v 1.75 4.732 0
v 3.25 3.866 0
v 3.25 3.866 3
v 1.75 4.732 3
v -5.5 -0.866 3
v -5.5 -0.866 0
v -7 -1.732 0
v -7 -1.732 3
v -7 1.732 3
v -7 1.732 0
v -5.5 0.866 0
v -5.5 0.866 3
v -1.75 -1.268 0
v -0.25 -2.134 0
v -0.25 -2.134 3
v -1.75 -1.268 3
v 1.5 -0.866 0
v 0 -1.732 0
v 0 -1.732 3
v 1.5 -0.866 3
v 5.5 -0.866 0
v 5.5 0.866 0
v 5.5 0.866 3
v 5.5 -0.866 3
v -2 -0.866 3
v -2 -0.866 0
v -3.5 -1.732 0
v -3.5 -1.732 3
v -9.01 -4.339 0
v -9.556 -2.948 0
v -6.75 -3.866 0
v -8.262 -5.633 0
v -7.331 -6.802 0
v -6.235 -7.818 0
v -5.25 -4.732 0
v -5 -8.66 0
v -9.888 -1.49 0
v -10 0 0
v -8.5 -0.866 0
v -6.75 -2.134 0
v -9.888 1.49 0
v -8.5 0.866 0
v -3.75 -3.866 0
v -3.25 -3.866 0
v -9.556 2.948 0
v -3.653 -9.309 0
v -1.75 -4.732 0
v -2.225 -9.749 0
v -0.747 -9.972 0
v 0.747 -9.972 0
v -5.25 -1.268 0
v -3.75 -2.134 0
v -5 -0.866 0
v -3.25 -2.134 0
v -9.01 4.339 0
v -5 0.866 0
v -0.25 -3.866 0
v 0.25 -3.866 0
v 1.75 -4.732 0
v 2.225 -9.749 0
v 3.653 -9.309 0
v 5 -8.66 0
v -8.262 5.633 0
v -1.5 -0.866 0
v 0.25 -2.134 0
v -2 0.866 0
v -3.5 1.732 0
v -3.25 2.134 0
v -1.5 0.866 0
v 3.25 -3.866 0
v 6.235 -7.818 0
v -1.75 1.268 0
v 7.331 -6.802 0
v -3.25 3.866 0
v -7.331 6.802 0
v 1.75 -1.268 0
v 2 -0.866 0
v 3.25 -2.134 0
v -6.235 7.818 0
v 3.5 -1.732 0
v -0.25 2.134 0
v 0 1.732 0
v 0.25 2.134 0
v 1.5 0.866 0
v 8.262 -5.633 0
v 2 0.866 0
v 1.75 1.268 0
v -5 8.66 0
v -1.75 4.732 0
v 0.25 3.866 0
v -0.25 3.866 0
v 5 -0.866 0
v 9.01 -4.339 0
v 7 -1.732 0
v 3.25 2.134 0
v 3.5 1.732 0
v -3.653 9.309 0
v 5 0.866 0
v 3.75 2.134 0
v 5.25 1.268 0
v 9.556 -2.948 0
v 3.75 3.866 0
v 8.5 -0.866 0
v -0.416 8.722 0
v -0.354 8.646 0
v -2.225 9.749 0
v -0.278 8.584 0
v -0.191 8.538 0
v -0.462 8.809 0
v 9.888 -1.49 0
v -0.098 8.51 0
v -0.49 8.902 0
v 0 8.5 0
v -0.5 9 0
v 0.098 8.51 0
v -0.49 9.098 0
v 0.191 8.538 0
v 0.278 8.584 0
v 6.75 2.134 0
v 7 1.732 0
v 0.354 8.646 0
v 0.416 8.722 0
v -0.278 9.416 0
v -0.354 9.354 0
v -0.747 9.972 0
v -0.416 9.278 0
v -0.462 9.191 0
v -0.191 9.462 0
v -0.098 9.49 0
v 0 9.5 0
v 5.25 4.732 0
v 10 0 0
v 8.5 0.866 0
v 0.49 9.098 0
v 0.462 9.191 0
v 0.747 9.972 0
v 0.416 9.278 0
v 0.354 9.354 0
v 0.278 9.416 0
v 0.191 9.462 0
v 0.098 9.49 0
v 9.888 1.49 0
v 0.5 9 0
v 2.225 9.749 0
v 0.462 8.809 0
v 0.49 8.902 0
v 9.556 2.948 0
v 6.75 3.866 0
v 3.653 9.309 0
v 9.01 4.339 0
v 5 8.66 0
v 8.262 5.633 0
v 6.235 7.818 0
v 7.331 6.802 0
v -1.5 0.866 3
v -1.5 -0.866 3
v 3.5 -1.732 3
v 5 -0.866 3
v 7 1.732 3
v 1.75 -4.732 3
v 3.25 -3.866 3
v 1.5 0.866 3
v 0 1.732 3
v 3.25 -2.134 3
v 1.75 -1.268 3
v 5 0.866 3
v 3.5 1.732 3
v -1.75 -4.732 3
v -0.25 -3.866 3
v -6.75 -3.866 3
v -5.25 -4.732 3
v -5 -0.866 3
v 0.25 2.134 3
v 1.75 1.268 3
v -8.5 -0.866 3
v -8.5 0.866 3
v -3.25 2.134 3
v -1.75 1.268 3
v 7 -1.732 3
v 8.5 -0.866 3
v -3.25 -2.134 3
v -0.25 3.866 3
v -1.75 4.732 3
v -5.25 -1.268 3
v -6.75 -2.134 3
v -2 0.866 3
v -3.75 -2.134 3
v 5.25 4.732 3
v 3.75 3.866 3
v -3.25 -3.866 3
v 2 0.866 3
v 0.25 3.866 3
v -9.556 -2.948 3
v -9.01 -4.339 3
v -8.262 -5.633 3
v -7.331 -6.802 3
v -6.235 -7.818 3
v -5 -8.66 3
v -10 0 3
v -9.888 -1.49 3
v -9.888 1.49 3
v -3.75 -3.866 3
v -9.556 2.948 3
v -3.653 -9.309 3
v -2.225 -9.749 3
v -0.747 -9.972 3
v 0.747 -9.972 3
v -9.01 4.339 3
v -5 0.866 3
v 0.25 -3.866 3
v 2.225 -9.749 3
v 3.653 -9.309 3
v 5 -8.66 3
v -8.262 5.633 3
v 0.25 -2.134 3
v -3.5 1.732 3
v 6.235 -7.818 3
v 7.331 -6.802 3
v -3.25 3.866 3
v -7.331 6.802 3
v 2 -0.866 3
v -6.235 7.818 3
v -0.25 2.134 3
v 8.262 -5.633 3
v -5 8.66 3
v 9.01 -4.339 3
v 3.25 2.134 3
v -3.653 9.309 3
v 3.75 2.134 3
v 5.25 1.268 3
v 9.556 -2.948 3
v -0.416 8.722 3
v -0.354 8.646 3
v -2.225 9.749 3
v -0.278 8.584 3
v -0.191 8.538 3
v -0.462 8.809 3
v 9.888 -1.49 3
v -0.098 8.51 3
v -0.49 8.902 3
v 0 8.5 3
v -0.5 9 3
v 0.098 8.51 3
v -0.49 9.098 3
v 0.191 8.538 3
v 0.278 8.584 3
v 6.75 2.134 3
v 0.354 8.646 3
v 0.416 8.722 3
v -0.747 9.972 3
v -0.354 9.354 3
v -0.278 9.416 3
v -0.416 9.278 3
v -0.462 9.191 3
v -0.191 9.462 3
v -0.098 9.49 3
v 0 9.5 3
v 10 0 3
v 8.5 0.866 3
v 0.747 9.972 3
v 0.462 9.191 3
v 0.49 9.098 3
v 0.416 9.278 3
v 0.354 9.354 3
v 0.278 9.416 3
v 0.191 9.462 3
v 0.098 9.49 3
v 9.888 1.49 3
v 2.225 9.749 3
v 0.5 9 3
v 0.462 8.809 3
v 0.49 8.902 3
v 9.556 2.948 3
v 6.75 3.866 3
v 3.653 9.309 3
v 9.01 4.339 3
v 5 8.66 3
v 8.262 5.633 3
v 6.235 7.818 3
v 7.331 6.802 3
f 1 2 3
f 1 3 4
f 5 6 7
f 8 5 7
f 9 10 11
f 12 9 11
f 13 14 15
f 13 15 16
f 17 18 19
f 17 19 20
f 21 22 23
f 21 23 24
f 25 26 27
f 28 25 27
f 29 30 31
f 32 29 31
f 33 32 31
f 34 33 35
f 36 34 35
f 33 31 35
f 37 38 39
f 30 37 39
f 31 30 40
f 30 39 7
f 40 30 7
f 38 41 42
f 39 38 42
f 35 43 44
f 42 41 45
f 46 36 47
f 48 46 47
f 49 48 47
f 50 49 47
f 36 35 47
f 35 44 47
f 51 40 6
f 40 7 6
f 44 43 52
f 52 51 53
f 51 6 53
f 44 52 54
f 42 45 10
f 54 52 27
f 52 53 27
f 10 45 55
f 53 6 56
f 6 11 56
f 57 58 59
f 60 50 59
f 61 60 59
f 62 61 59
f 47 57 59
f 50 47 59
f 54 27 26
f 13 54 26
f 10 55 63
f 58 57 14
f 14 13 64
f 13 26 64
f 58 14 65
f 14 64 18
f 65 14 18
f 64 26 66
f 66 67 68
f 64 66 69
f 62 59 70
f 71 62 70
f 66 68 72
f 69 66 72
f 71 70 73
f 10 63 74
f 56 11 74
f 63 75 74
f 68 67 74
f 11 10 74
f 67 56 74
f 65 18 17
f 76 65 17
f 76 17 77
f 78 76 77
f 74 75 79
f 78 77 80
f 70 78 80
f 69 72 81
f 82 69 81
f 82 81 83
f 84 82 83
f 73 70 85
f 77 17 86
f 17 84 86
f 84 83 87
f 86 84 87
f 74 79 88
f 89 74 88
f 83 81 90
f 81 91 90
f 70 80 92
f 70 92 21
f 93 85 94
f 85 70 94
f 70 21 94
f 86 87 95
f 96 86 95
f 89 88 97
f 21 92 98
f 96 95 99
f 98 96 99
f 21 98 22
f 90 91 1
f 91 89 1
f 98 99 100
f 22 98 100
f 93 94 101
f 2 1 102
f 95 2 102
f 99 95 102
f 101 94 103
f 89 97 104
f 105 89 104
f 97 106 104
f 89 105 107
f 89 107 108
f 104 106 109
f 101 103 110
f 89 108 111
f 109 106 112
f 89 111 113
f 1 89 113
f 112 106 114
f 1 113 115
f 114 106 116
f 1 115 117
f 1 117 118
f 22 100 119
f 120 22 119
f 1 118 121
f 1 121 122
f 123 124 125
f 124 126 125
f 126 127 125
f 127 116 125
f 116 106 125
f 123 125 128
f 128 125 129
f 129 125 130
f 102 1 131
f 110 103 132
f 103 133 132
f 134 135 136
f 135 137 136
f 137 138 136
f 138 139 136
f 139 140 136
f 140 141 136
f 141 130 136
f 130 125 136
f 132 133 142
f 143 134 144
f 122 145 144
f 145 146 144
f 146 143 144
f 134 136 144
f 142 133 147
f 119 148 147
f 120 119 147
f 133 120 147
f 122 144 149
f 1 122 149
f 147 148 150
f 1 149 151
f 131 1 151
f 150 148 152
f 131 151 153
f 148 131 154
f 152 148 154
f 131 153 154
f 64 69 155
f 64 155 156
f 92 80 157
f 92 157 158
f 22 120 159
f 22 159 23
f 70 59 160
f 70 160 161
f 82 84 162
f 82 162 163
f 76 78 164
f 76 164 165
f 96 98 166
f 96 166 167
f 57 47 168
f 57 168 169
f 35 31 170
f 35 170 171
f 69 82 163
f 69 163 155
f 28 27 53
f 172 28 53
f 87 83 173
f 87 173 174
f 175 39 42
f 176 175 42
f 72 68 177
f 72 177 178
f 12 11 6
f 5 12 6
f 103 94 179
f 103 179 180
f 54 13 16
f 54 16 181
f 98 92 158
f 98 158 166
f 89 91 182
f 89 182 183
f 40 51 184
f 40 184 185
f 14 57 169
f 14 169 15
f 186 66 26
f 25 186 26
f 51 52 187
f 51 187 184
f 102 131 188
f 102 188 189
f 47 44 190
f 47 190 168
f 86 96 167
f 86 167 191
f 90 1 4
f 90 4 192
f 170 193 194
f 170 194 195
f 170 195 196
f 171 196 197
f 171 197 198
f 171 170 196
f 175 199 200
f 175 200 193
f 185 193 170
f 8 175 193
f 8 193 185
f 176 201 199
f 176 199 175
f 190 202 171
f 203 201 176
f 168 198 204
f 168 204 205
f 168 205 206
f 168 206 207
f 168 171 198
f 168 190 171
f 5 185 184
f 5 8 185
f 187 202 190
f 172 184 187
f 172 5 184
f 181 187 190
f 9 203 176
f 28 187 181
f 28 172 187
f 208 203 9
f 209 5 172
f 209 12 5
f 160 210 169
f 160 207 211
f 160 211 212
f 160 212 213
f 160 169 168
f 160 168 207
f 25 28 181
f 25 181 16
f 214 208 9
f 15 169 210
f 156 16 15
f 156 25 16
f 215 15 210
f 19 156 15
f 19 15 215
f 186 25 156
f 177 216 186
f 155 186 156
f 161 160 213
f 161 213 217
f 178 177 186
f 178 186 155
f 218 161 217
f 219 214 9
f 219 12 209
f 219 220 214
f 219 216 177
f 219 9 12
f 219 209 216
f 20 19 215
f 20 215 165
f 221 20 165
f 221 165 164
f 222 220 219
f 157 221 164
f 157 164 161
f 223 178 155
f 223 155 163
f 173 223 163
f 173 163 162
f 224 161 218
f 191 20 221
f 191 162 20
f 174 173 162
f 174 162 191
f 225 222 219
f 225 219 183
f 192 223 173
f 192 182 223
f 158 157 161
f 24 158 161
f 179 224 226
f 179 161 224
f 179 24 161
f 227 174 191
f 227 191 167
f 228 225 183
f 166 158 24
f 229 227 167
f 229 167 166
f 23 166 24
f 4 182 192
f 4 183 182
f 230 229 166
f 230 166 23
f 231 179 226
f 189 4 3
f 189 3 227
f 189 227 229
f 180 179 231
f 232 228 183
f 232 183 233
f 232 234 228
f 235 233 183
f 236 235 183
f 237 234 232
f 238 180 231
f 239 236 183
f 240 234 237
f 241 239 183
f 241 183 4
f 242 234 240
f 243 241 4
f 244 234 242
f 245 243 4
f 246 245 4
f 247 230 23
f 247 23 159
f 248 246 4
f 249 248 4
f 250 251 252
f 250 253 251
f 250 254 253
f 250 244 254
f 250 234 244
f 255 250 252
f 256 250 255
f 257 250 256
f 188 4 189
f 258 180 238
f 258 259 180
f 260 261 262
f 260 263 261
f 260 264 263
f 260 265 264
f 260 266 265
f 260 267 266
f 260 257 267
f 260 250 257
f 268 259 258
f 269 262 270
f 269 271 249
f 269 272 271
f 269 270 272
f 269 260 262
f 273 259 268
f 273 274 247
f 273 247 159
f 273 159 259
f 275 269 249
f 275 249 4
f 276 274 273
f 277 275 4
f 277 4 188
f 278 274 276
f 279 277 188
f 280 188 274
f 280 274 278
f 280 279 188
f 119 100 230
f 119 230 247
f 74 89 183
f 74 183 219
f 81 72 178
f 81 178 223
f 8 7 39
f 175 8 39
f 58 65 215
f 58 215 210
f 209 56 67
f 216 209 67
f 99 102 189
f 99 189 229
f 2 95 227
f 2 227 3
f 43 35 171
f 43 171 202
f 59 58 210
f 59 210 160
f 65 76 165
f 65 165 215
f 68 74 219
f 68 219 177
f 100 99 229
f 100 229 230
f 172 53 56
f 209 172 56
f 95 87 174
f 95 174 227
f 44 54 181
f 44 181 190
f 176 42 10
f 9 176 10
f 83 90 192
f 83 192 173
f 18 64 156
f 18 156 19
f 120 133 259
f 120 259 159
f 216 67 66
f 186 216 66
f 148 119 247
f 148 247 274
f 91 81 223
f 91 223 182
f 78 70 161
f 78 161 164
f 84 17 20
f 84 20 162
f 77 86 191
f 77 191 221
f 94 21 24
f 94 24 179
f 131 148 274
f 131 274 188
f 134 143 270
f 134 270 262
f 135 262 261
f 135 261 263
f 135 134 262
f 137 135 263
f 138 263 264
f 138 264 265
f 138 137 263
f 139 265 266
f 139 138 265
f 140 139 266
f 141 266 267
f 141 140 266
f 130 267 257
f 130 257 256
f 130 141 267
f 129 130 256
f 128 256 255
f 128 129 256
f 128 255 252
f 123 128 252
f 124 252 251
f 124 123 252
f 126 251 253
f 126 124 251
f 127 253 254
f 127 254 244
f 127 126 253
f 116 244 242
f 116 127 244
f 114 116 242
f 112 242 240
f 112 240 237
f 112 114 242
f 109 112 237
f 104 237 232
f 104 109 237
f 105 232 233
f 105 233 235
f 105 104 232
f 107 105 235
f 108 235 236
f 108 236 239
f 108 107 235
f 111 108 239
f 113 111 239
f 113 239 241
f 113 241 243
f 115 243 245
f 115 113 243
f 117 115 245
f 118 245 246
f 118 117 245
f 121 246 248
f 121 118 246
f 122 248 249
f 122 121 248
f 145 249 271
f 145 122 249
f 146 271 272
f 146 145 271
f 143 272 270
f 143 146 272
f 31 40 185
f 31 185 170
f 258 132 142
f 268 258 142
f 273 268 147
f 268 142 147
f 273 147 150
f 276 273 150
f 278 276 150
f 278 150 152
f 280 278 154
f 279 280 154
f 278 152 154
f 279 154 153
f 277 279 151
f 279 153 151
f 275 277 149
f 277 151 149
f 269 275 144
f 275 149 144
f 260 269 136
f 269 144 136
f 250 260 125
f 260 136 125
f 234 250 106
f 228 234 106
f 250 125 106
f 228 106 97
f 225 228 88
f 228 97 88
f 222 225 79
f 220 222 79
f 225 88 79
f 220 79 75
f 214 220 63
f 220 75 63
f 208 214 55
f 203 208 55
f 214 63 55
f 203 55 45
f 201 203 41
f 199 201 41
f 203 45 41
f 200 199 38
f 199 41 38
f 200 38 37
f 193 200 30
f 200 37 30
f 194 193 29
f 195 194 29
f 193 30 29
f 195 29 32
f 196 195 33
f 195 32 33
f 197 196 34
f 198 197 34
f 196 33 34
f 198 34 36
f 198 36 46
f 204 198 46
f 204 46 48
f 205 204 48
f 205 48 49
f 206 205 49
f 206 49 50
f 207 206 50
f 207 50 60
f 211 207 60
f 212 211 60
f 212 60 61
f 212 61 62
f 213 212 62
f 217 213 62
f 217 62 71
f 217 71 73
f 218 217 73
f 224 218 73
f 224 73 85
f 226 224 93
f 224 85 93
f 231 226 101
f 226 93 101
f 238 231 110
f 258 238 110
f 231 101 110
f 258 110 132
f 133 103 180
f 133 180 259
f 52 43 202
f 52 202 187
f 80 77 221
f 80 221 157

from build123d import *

# Parameters (mm, degrees)
SKETCH1_R           = 10
SKETCH1_R_2         = 0.5
BOSS_EXTRUDE1_DEPTH = 3


with BuildPart() as part:
    # Sketch1 → Boss-Extrude1 (new body)
    with BuildSketch(Plane.XY):
        Circle(SKETCH1_R)
        with Locations((0, 9)):
            Circle(SKETCH1_R_2, mode=Mode.SUBTRACT)
        Polygon((2, -0.866025404), (3.5, -1.732050808), (5, -0.866025404), (5, 0.866025404), (3.5, 1.732050808), (2, 0.866025404), align=None, mode=Mode.SUBTRACT)
        Polygon((-1.75, 1.267949192), (-0.25, 2.133974596), (-0.25, 3.866025404), (-1.75, 4.732050808), (-3.25, 3.866025404), (-3.25, 2.133974596), align=None, mode=Mode.SUBTRACT)
        Polygon((-1.5, -0.866025404), (0, -1.732050808), (1.5, -0.866025404), (1.5, 0.866025404), (0, 1.732050808), (-1.5, 0.866025404), align=None, mode=Mode.SUBTRACT)
        Polygon((5.5, -0.866025404), (7, -1.732050808), (8.5, -0.866025404), (8.5, 0.866025404), (7, 1.732050808), (5.5, 0.866025404), align=None, mode=Mode.SUBTRACT)
        Polygon((-5.5, 0.866025404), (-5.5, -0.866025404), (-7, -1.732050808), (-8.5, -0.866025404), (-8.5, 0.866025404), (-7, 1.732050808), align=None, mode=Mode.SUBTRACT)
        Polygon((-2, 0.866025404), (-2, -0.866025404), (-3.5, -1.732050808), (-5, -0.866025404), (-5, 0.866025404), (-3.5, 1.732050808), align=None, mode=Mode.SUBTRACT)
        Polygon((1.75, 1.267949192), (3.25, 2.133974596), (3.25, 3.866025404), (1.75, 4.732050808), (0.25, 3.866025404), (0.25, 2.133974596), align=None, mode=Mode.SUBTRACT)
        Polygon((5.25, 1.267949192), (6.75, 2.133974596), (6.75, 3.866025404), (5.25, 4.732050808), (3.75, 3.866025404), (3.75, 2.133974596), align=None, mode=Mode.SUBTRACT)
        Polygon((-0.25, -2.133974596), (-1.75, -1.267949192), (-3.25, -2.133974596), (-3.25, -3.866025404), (-1.75, -4.732050808), (-0.25, -3.866025404), align=None, mode=Mode.SUBTRACT)
        Polygon((3.25, -2.133974596), (1.75, -1.267949192), (0.25, -2.133974596), (0.25, -3.866025404), (1.75, -4.732050808), (3.25, -3.866025404), align=None, mode=Mode.SUBTRACT)
        Polygon((-3.75, -2.133974596), (-5.25, -1.267949192), (-6.75, -2.133974596), (-6.75, -3.866025404), (-5.25, -4.732050808), (-3.75, -3.866025404), align=None, mode=Mode.SUBTRACT)
    extrude(amount=BOSS_EXTRUDE1_DEPTH)


solid = part.part
